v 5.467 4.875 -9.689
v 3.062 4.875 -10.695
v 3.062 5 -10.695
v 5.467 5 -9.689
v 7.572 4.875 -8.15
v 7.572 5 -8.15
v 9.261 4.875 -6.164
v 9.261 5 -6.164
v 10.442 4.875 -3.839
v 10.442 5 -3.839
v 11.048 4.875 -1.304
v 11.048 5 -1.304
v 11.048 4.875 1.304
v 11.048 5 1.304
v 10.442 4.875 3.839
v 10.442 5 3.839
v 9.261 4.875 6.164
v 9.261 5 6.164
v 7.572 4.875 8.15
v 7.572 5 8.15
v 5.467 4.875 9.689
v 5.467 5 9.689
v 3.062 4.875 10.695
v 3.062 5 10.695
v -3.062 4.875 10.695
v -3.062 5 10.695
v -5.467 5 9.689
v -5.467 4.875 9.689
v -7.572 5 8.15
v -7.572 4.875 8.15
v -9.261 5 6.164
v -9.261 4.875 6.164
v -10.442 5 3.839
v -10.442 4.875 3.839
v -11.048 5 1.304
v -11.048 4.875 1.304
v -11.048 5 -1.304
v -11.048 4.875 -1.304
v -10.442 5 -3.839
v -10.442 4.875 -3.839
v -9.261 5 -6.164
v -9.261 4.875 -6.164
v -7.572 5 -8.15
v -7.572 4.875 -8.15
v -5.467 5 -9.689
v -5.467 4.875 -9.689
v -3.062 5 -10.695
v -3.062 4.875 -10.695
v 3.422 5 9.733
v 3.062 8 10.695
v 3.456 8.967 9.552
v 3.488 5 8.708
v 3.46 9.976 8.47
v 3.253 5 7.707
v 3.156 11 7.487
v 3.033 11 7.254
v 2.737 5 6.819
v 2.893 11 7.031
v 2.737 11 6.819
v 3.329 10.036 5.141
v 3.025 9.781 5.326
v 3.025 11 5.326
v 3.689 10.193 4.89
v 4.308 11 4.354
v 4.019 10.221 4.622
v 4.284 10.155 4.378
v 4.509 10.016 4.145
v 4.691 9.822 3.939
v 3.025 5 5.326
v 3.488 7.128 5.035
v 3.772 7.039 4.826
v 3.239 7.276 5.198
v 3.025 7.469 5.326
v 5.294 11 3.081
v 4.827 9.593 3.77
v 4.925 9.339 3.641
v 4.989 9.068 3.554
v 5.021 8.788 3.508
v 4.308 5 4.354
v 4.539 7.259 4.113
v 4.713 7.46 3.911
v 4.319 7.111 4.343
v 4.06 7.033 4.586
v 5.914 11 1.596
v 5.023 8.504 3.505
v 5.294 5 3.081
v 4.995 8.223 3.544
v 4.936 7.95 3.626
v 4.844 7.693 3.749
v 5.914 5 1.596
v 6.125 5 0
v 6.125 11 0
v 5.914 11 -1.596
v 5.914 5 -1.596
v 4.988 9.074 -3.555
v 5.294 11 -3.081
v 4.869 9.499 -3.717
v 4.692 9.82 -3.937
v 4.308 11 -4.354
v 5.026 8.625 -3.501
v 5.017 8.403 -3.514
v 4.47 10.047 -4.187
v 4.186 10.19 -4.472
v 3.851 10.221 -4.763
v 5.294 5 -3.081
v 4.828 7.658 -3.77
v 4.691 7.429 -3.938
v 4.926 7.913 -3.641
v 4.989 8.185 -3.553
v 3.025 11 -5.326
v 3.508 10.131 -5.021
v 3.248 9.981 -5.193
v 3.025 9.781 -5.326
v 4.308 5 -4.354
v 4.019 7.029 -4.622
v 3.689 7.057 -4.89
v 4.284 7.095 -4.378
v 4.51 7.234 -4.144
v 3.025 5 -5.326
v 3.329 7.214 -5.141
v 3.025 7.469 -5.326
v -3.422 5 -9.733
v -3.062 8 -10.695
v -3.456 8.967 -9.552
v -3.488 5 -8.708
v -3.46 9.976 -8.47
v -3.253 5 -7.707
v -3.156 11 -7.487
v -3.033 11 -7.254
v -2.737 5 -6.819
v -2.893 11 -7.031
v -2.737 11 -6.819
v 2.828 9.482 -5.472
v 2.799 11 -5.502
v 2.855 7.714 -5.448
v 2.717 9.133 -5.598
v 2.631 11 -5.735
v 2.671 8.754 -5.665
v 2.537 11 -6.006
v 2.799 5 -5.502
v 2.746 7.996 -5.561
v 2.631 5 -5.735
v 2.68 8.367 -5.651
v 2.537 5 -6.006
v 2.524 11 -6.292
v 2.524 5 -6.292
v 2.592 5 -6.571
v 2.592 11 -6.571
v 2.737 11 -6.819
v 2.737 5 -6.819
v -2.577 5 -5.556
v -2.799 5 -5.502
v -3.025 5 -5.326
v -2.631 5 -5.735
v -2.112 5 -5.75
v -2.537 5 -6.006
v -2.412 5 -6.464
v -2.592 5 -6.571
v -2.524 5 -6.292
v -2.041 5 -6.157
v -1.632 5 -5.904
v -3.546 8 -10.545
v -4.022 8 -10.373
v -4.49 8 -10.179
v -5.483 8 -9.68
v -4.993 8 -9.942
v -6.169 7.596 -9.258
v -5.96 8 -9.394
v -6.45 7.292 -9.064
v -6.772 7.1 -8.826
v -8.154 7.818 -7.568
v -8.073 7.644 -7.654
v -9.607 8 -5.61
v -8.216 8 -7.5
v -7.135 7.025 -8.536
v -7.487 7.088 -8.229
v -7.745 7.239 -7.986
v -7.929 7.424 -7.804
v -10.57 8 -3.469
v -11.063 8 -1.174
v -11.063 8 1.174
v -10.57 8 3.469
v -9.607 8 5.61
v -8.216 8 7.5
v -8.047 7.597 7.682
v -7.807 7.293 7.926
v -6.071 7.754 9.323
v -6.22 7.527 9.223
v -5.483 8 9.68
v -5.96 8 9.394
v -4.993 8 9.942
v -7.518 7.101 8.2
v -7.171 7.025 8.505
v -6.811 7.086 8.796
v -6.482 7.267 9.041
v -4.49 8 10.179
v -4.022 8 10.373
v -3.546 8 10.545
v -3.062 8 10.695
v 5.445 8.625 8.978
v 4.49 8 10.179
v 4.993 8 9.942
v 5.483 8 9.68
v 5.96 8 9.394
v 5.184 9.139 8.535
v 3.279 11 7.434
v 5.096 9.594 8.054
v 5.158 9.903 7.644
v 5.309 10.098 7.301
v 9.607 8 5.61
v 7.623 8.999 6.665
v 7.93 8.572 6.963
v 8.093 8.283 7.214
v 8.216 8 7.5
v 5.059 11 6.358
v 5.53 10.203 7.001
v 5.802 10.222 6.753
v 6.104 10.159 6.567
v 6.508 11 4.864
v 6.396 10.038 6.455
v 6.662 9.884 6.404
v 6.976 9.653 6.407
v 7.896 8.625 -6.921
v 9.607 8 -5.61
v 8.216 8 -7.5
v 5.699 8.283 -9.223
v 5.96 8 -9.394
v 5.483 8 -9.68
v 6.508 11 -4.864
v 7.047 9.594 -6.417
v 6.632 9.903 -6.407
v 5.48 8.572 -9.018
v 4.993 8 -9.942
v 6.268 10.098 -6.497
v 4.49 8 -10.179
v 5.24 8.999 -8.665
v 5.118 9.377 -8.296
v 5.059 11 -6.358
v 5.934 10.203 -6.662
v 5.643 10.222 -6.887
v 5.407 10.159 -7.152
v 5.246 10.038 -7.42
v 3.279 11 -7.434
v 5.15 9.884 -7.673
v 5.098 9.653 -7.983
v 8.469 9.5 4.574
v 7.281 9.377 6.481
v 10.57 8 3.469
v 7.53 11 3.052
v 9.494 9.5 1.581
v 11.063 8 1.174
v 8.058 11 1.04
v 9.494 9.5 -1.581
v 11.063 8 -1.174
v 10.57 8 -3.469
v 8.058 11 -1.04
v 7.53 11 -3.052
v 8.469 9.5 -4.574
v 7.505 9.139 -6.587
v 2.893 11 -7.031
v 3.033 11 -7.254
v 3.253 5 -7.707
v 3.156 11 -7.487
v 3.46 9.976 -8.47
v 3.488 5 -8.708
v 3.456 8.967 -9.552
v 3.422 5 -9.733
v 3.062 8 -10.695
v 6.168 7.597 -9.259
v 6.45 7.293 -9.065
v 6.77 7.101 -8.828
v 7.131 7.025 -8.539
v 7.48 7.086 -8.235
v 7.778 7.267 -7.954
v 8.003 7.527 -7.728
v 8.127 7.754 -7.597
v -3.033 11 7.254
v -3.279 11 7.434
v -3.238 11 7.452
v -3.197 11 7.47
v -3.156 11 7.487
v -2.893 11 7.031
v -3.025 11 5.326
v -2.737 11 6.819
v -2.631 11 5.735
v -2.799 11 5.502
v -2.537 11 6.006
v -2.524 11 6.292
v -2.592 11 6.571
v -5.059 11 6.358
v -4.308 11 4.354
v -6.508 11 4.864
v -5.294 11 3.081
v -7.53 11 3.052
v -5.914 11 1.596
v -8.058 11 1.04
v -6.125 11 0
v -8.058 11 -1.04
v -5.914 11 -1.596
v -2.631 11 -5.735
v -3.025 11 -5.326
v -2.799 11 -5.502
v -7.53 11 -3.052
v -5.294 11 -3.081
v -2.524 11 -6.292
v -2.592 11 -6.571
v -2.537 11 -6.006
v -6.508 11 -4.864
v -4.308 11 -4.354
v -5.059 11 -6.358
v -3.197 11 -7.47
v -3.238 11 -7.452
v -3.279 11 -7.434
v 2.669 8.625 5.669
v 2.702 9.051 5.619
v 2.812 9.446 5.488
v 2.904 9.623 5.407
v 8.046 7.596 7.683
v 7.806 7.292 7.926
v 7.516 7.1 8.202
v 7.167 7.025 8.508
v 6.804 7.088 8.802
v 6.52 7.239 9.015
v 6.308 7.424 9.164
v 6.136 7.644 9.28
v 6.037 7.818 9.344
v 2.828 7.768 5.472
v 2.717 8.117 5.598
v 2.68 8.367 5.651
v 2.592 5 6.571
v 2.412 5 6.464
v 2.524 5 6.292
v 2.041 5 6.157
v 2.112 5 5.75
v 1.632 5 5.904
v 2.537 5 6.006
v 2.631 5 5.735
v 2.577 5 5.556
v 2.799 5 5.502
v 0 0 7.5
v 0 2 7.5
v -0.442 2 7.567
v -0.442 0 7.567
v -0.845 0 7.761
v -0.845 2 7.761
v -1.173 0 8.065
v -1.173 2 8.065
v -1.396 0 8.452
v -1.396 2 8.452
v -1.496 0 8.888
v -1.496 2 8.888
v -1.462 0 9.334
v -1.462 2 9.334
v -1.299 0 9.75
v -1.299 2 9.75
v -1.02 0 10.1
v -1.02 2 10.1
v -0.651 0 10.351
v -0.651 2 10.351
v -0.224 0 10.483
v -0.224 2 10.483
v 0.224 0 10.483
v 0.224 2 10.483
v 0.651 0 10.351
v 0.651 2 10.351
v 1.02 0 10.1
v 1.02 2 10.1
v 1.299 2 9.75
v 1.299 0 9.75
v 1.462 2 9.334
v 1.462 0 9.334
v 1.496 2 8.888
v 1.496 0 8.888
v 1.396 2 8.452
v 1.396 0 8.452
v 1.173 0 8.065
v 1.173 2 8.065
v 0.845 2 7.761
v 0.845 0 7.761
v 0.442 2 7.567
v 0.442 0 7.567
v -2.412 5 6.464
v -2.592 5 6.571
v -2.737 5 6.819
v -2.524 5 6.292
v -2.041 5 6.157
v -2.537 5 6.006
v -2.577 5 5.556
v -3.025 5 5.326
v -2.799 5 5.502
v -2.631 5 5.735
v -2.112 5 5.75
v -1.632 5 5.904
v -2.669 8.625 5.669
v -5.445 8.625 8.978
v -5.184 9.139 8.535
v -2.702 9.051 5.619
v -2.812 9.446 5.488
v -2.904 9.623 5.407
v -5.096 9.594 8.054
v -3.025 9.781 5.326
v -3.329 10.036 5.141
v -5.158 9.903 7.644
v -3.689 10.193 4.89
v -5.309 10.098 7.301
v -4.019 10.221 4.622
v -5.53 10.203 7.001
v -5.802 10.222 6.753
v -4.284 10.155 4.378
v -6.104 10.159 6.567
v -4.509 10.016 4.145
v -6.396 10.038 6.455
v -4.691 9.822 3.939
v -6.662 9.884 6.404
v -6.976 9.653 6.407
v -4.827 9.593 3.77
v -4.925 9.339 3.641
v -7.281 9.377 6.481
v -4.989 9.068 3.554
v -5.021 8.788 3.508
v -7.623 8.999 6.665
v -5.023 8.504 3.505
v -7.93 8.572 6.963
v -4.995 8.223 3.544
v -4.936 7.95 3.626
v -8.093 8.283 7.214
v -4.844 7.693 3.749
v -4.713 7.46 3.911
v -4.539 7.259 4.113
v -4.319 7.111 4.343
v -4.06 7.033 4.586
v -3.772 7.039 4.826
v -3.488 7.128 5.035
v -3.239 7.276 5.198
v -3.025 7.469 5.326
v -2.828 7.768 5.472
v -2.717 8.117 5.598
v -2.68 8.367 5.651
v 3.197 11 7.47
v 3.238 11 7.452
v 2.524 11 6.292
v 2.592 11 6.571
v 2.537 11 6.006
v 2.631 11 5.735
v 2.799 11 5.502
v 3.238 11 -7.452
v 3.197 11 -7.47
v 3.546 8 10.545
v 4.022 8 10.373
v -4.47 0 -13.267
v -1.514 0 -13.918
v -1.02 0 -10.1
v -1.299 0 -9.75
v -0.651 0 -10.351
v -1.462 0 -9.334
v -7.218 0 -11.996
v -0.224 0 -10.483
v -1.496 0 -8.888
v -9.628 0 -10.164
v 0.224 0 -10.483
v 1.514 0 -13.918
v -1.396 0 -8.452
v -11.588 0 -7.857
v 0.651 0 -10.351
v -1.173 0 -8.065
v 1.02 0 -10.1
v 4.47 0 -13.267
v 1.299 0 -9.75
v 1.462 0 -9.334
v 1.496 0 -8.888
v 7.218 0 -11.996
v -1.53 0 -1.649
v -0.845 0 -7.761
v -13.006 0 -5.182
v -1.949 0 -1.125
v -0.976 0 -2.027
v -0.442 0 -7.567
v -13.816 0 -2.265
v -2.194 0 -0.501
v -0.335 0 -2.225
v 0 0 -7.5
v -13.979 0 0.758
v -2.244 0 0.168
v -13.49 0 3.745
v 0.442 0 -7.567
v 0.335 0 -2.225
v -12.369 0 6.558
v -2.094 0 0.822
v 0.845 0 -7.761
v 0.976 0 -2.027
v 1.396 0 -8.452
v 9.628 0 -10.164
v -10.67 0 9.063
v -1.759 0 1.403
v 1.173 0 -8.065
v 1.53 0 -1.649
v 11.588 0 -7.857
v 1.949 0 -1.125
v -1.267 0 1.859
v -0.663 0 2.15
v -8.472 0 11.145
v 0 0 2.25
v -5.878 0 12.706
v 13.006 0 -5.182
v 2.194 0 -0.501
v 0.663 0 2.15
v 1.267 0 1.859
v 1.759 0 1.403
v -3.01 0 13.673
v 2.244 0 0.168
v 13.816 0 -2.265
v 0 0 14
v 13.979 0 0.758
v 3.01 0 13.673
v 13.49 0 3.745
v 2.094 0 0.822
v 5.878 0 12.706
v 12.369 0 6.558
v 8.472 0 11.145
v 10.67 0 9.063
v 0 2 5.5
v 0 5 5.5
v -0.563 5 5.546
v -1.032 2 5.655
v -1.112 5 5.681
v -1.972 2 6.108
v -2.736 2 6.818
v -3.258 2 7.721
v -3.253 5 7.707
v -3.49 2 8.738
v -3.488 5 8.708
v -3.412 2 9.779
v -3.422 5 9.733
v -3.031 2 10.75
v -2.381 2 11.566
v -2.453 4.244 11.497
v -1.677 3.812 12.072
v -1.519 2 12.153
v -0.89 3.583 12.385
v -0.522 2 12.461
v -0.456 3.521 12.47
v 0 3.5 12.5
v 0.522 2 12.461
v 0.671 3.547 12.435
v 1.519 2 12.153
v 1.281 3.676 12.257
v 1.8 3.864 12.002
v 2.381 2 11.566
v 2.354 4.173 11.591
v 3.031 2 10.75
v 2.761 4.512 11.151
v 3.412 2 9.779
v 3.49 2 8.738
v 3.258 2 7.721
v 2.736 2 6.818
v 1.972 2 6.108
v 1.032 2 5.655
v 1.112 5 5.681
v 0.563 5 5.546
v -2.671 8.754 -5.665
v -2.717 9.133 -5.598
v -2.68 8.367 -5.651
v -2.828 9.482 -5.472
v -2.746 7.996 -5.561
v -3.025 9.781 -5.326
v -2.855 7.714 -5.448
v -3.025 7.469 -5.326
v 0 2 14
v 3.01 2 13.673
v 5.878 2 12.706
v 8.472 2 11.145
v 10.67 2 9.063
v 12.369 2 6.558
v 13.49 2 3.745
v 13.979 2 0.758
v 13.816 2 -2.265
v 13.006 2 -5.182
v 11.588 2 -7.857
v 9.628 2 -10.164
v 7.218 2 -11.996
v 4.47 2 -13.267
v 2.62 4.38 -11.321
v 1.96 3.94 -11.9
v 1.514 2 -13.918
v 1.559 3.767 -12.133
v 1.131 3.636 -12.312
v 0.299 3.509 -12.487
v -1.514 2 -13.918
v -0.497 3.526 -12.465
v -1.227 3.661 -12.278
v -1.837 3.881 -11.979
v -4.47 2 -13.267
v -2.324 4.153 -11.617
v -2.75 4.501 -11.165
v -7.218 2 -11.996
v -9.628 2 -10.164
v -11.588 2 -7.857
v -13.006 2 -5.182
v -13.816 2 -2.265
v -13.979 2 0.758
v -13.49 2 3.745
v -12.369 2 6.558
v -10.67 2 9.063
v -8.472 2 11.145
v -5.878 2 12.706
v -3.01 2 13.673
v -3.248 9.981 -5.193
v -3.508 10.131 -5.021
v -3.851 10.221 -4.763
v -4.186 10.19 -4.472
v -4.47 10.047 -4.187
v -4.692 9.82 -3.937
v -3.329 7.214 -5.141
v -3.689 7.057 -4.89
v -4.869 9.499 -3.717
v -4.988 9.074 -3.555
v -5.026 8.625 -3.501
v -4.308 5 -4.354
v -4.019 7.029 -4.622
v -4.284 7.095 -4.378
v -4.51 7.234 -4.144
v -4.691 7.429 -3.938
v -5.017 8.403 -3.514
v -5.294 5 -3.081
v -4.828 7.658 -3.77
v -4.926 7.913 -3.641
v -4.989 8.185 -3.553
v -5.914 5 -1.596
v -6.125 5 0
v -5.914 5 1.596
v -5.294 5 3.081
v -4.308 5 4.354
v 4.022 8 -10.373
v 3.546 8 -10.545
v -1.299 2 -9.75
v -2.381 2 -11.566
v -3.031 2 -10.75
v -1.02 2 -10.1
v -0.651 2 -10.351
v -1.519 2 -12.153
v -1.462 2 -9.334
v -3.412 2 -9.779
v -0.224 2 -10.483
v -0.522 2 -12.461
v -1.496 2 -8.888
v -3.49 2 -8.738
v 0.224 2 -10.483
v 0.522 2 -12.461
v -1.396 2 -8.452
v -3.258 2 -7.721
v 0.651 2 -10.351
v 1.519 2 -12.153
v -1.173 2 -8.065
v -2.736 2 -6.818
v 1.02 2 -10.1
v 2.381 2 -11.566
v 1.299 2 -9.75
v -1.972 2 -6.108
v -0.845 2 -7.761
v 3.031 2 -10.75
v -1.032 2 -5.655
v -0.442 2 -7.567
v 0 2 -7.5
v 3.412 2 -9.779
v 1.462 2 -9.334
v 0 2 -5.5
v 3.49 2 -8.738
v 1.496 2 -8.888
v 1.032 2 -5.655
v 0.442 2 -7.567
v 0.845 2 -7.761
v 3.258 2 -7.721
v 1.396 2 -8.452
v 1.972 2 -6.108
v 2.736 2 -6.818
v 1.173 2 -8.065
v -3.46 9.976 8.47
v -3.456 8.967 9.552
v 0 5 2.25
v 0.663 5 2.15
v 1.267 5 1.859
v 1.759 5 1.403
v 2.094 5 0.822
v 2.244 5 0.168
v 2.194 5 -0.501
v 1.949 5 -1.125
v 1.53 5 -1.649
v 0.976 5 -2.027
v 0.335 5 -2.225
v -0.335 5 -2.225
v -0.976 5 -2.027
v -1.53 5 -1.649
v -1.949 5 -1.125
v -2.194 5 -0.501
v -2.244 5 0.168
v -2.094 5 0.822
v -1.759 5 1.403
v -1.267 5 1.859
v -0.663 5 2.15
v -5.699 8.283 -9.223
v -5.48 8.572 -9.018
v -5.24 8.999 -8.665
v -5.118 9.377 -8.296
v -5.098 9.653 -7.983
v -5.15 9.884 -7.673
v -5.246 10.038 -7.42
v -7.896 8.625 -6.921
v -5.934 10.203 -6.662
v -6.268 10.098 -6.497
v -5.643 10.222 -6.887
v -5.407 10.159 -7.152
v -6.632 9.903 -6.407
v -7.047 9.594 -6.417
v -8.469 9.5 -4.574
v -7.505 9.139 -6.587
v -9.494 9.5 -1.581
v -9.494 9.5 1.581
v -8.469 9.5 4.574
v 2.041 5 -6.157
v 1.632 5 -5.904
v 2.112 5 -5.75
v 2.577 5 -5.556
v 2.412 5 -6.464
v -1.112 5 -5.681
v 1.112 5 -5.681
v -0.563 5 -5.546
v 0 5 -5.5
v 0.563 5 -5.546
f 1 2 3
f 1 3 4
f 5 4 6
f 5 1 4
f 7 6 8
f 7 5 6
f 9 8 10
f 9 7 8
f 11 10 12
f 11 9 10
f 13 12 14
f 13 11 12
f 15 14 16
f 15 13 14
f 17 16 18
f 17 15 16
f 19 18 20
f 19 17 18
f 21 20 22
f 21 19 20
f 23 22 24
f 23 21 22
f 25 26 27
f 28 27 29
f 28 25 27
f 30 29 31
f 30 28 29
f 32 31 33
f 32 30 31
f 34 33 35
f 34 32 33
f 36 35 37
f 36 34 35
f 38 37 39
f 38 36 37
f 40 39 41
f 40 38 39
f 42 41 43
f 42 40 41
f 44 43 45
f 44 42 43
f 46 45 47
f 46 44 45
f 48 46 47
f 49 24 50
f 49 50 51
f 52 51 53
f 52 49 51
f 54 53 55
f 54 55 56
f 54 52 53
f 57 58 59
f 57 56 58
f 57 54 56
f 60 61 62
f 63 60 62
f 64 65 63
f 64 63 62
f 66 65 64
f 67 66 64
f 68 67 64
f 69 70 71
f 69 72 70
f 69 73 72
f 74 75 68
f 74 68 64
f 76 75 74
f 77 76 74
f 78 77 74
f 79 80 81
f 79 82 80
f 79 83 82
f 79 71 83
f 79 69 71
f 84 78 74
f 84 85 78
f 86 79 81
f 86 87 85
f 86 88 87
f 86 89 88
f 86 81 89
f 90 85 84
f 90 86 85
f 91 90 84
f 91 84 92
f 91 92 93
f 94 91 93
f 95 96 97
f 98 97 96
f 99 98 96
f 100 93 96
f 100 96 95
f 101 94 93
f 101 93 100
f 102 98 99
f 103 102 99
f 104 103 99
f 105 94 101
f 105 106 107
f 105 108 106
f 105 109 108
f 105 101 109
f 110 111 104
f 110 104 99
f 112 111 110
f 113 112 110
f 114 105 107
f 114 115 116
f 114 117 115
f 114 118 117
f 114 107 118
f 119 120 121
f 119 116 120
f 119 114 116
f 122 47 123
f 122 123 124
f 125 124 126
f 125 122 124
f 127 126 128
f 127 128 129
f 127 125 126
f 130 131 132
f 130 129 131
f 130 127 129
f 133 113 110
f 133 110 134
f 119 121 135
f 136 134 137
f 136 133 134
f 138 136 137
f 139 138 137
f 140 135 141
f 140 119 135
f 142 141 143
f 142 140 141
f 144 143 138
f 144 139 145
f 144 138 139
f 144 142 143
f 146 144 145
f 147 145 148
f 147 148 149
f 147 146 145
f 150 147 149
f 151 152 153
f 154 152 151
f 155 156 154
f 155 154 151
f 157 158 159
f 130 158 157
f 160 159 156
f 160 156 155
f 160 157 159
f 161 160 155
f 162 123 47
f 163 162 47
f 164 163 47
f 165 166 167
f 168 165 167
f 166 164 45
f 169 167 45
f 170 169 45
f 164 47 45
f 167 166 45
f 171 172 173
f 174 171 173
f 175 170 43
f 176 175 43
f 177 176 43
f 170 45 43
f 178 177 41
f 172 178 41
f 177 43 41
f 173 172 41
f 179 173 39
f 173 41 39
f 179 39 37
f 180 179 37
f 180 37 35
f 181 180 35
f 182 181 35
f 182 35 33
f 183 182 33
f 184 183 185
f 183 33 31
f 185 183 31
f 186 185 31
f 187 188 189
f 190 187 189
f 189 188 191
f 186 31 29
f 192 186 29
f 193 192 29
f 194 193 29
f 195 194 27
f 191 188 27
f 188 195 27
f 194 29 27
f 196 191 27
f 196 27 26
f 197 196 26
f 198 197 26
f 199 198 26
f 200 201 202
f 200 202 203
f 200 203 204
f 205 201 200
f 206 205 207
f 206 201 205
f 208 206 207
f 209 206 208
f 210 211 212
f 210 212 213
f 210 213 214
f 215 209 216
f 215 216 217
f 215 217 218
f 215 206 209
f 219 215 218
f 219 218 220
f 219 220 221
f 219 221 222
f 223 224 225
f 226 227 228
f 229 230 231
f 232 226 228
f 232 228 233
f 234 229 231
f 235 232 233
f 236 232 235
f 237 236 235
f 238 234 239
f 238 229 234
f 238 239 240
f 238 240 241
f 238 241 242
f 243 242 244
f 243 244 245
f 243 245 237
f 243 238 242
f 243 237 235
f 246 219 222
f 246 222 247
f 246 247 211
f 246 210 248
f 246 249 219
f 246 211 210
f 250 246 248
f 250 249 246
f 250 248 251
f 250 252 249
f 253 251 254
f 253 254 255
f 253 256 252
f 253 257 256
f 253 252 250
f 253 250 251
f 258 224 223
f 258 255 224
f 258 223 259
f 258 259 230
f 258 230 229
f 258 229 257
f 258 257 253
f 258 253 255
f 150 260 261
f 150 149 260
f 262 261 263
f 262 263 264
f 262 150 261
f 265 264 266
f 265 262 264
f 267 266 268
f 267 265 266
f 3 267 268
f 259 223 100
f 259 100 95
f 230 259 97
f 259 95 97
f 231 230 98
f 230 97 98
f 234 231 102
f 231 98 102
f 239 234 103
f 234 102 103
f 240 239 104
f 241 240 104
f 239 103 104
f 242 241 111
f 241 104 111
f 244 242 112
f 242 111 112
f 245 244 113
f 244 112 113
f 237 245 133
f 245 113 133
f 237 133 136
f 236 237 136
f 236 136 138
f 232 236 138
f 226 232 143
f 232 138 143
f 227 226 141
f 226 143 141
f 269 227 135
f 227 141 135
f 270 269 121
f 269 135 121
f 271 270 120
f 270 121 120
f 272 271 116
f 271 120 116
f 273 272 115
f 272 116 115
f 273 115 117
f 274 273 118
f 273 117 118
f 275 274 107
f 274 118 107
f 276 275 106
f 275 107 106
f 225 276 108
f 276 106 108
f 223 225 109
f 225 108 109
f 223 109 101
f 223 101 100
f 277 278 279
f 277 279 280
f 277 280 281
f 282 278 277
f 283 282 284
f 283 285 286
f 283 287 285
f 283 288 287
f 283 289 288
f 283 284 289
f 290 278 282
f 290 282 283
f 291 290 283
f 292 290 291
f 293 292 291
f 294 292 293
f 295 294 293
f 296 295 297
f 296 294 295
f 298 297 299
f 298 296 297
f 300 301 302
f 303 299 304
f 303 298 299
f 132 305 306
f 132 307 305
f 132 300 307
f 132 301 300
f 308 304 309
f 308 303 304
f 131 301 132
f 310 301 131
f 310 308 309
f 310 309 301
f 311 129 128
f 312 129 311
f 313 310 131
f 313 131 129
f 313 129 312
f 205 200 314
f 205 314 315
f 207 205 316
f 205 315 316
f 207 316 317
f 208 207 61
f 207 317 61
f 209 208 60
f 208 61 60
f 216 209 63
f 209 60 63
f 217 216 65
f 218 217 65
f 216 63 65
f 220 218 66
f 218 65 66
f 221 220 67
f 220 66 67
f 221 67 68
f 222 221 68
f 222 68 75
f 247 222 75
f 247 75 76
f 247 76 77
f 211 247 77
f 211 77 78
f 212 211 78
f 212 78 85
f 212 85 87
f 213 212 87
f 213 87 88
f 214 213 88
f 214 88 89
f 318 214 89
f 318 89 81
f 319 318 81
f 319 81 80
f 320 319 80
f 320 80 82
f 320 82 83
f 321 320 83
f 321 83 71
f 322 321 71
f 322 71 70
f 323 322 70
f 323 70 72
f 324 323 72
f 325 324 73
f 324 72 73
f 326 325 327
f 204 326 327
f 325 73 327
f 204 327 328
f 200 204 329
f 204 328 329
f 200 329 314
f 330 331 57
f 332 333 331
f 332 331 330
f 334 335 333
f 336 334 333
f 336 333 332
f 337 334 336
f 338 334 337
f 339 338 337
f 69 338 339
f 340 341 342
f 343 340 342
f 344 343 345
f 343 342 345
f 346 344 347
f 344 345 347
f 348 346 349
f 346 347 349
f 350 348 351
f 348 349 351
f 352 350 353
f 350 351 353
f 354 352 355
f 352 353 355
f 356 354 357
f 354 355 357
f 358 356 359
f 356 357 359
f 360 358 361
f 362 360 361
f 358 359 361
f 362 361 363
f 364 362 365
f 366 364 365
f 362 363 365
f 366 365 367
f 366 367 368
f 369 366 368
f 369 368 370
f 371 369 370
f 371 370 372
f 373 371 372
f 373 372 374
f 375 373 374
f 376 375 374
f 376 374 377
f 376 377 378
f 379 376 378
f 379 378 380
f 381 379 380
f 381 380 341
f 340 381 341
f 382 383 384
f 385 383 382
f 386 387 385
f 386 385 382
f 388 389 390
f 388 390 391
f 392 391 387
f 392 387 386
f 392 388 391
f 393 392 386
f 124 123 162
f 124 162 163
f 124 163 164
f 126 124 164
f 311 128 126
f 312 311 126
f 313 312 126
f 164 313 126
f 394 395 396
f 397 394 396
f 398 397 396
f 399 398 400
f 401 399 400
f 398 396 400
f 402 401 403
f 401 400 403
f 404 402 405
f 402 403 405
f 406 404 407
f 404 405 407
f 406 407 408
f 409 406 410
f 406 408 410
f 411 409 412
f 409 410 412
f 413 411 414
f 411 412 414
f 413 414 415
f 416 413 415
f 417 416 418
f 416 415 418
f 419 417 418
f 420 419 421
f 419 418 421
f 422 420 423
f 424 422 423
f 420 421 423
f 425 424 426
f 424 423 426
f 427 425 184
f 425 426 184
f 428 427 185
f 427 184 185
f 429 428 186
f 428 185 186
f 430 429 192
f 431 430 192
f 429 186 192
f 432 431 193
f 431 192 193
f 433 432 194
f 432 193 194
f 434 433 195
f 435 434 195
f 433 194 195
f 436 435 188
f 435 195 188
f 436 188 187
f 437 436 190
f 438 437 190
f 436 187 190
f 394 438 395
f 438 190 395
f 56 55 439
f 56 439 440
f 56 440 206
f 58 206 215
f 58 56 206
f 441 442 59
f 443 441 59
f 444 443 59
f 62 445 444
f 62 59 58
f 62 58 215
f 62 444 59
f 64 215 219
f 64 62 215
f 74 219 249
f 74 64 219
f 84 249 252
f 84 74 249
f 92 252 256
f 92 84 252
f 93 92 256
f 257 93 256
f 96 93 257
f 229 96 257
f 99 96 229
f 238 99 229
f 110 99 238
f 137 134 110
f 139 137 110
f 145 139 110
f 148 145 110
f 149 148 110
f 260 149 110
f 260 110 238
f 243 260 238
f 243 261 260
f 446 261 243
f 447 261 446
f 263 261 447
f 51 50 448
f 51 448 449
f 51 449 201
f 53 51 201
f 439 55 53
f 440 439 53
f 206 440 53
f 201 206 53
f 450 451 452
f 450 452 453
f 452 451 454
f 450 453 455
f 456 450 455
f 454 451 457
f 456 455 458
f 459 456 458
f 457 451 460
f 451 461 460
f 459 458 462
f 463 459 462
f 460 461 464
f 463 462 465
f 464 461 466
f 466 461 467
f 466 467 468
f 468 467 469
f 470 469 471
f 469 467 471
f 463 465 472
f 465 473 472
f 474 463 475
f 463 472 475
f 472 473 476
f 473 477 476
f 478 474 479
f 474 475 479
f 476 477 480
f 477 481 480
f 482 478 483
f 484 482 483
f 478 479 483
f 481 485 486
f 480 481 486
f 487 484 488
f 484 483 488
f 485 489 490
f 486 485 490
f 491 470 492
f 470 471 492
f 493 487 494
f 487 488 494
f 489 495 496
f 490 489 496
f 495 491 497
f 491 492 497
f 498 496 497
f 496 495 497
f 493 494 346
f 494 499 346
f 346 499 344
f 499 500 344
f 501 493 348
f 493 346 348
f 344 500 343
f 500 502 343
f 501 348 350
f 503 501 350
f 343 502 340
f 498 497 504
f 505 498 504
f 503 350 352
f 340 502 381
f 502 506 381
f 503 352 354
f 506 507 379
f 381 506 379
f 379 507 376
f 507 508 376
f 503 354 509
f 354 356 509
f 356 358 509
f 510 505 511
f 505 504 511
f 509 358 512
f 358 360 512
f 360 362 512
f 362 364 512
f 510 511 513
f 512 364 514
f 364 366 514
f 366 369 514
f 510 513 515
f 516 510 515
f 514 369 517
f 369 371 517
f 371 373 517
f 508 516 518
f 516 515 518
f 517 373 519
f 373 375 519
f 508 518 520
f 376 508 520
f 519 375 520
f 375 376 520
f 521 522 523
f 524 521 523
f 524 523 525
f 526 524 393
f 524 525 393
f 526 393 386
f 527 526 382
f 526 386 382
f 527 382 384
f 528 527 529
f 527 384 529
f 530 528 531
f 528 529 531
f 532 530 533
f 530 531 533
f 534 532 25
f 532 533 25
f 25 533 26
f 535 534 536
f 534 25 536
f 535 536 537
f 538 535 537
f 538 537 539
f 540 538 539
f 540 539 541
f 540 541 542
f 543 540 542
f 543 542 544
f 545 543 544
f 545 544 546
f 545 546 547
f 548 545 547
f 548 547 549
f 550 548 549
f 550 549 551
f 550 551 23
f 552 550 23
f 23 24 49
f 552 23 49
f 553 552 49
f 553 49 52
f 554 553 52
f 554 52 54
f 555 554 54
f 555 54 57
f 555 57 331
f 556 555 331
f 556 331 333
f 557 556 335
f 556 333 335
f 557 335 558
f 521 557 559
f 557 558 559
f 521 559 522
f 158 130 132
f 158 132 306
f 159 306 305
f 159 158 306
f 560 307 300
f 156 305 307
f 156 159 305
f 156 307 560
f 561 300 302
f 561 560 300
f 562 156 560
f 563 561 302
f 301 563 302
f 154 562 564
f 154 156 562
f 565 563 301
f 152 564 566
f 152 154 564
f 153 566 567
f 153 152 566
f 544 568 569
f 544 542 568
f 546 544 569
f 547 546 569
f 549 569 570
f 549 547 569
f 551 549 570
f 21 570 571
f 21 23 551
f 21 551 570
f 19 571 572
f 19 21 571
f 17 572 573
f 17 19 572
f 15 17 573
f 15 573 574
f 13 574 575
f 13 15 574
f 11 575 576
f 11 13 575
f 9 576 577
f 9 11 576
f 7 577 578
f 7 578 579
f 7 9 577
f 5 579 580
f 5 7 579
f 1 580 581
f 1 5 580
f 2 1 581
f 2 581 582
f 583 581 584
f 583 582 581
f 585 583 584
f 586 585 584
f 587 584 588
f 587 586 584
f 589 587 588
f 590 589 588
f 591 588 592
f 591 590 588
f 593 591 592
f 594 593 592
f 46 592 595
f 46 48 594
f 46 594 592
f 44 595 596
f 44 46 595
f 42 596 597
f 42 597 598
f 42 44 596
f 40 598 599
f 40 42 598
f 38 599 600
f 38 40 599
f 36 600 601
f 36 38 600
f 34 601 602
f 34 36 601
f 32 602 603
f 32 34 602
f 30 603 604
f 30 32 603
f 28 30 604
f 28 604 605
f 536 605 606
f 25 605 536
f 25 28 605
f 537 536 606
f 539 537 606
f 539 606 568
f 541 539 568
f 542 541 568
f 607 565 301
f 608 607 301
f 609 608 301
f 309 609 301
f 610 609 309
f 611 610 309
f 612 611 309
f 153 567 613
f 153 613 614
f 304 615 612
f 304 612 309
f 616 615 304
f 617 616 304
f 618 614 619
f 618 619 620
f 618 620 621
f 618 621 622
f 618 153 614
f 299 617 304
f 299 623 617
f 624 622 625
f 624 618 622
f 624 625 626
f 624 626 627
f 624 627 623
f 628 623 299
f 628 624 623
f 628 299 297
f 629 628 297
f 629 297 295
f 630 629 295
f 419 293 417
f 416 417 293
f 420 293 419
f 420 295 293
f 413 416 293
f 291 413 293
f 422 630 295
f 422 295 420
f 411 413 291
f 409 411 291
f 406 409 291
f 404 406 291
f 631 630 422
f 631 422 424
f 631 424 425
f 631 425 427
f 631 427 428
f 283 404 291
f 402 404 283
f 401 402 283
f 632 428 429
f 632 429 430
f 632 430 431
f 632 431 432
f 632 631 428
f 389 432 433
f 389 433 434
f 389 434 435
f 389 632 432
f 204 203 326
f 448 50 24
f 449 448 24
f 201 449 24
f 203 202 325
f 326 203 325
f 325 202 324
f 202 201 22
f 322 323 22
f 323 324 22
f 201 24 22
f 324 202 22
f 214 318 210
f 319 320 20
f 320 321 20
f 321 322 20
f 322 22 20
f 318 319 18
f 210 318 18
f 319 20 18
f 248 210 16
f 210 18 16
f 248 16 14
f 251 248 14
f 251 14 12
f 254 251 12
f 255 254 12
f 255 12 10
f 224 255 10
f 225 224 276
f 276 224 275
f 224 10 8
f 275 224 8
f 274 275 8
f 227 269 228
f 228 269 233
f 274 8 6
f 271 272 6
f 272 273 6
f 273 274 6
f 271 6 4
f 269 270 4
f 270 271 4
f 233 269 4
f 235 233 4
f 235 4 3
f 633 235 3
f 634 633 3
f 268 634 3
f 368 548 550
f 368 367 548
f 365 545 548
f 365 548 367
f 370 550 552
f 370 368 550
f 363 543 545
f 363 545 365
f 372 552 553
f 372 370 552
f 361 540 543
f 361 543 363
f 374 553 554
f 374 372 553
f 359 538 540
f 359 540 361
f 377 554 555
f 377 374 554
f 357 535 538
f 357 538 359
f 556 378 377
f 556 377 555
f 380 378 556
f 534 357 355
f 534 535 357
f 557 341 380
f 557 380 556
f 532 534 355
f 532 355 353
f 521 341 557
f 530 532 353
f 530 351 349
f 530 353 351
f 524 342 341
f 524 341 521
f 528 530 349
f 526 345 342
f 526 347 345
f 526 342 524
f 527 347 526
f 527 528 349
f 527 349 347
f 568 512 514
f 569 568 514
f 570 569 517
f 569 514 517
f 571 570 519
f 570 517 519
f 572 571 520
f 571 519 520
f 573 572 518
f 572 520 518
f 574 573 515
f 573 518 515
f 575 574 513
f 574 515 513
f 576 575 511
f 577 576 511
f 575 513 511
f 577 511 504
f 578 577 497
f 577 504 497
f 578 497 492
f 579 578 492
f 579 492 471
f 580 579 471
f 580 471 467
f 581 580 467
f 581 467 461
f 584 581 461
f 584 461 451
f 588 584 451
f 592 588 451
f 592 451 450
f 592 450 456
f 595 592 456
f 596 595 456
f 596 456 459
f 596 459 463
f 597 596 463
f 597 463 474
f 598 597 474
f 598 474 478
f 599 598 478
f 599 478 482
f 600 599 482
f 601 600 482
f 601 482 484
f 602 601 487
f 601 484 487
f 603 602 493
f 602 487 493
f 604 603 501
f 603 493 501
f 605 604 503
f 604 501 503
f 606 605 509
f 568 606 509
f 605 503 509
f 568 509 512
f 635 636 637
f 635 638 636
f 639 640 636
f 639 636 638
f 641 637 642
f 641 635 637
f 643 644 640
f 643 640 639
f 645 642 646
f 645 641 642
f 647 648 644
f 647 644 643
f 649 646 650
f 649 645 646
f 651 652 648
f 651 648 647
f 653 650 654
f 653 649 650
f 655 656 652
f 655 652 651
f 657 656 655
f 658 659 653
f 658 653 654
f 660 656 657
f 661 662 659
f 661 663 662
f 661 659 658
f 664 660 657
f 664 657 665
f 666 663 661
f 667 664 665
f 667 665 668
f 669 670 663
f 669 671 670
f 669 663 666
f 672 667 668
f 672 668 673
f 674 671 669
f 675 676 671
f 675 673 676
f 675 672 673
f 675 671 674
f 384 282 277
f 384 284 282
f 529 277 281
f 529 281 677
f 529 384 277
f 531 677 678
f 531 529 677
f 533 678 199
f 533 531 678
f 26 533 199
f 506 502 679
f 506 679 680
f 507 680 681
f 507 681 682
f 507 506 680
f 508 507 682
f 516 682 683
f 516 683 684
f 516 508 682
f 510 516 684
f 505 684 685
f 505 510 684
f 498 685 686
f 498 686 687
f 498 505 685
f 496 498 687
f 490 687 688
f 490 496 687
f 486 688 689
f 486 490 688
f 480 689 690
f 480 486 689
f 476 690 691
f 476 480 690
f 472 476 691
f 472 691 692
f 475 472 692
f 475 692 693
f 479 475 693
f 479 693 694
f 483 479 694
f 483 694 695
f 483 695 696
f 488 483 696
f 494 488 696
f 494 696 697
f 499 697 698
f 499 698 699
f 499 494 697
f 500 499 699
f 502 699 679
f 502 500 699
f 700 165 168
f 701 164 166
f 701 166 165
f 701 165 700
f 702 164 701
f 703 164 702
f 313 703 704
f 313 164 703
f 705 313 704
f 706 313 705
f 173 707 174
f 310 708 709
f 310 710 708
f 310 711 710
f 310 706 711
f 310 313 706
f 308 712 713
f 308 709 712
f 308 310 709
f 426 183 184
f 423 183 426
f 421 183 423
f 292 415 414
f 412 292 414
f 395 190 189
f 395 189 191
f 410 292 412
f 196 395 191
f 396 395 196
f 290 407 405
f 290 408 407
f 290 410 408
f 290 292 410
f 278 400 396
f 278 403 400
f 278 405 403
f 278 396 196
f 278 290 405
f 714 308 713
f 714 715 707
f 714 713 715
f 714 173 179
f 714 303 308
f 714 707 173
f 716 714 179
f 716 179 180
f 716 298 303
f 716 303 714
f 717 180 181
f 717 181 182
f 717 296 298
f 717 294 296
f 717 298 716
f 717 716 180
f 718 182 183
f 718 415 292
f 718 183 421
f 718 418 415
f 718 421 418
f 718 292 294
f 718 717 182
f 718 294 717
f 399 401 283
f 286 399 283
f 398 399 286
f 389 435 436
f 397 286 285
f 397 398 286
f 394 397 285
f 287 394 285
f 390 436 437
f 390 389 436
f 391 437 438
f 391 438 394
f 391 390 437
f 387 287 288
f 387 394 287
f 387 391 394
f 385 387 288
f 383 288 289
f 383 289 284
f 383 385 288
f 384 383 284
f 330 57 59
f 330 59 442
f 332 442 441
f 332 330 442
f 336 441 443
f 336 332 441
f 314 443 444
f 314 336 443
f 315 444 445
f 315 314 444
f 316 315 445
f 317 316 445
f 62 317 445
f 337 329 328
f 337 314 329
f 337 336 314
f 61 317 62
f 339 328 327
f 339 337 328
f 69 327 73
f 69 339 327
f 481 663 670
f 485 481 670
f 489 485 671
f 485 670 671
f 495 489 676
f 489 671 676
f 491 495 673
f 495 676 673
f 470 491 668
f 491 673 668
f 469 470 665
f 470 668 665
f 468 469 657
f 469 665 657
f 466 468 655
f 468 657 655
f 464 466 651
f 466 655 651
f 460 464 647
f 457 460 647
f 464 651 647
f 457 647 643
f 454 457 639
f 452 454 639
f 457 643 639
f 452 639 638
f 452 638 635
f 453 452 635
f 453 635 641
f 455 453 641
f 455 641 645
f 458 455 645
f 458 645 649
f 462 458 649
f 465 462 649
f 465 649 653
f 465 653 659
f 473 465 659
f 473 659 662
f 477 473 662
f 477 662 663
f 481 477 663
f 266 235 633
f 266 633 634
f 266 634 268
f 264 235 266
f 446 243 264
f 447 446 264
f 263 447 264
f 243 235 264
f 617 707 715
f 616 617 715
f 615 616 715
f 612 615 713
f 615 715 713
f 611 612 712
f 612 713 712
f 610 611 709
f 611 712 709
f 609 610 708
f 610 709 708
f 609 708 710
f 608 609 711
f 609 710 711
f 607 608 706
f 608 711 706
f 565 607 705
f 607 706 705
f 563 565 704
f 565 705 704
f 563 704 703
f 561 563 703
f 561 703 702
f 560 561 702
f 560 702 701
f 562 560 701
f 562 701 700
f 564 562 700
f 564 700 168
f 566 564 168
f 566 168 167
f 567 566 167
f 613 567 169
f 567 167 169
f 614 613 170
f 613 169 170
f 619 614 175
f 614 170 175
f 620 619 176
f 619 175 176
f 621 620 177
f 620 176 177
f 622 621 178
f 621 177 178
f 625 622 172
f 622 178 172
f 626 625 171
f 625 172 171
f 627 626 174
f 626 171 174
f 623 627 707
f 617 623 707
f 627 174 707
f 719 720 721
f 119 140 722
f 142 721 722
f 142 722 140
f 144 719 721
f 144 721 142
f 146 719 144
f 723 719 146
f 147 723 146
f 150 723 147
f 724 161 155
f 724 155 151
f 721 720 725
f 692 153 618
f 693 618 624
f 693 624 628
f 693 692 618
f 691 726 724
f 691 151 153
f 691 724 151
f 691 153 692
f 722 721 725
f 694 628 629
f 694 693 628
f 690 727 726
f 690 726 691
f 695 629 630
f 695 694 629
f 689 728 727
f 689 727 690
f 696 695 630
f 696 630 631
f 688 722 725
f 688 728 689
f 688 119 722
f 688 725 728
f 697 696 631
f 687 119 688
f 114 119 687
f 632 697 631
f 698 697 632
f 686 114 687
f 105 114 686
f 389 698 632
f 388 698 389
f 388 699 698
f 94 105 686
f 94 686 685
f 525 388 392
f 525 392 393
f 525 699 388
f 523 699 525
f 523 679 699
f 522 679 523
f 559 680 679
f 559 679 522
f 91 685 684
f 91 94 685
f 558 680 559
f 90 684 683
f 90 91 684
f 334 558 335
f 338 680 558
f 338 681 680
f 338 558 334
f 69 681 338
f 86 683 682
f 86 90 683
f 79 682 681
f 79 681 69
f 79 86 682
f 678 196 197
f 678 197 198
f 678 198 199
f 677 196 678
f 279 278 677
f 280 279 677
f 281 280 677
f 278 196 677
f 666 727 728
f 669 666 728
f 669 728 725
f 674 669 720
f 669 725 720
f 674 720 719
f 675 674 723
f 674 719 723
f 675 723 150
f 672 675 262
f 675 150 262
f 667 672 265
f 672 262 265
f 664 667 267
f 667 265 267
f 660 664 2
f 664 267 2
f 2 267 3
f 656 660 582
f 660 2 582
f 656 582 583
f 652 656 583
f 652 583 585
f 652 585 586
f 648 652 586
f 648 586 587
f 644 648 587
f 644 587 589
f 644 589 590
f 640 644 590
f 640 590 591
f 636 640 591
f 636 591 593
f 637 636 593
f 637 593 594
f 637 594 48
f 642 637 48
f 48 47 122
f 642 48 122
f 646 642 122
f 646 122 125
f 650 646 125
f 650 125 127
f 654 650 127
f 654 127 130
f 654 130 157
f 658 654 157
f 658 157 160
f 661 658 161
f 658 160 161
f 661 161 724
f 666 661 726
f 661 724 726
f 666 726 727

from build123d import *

# Parameters (mm, degrees)
SKETCH1_R           = 14
SKETCH1_R_2         = 2.25
BOSS_EXTRUDE1_DEPTH = 5
SKETCH2_R           = 1.5
CUT_EXTRUDE1_DEPTH  = 21.420577857
SKETCH4_R           = 3.5
CUT_EXTRUDE2_DEPTH  = 3
CIRPATTERN1_COUNT   = 2
SKETCH5_R           = 11.125
SKETCH5_R_2         = 6.125
BOSS_EXTRUDE2_DEPTH = 6
SKETCH6_R           = 3.5
CUT_EXTRUDE3_DEPTH  = 21.688160866
CHAMFER1_SIZE       = 3
FILLET1_START       = 5
FILLET1_DEPTH       = 7
SKETCH8_R           = 1.6
CUT_EXTRUDE4_DEPTH  = 23.649503429
CHAMFER2_SIZE       = 3
CIRPATTERN2_COUNT   = 2
CIRPATTERN2_ANGLE   = 100


with BuildPart() as part:
    # Sketch1 → Boss-Extrude1 (new body)
    with BuildSketch(Plane(origin=(0, 0, 0), x_dir=(1, 0, 0), z_dir=(0, 1, 0))):
        with Locations(Location((0, 0, 0), (0, 0, 270))):
            Circle(SKETCH1_R)
        with Locations(Location((0, 0, 0), (0, 0, 270))):
            Circle(SKETCH1_R_2, mode=Mode.SUBTRACT)
    extrude(amount=BOSS_EXTRUDE1_DEPTH)

    # Sketch2 → Cut-Extrude1 (cut, through all)
    with BuildSketch(Plane(origin=(0, 5, 0), x_dir=(1, 0, 0), z_dir=(0, 1, 0))):
        with Locations(Location((0, 9, 0), (0, 0, 270))):
            Circle(SKETCH2_R)
    cut_extrude1 = extrude(amount=-CUT_EXTRUDE1_DEPTH, mode=Mode.SUBTRACT)

    # Sketch4 → Cut-Extrude2 (cut)
    with BuildSketch(Plane(origin=(0, 5, 0), x_dir=(1, 0, 0), z_dir=(0, 1, 0))):
        with Locations(Location((0, 9, 0), (0, 0, 270))):
            Circle(SKETCH4_R)
    cut_extrude2 = extrude(amount=-CUT_EXTRUDE2_DEPTH, mode=Mode.SUBTRACT)

    # CirPattern1: Cut-Extrude1, Cut-Extrude2 ×2 about axis
    cirpattern1_axis = Axis((0, 0, 0), (0, 1, 0))
    add([cut_extrude1.rotate(cirpattern1_axis, i * 360 / CIRPATTERN1_COUNT) for i in range(1, CIRPATTERN1_COUNT)], mode=Mode.SUBTRACT)
    add([cut_extrude2.rotate(cirpattern1_axis, i * 360 / CIRPATTERN1_COUNT) for i in range(1, CIRPATTERN1_COUNT)], mode=Mode.SUBTRACT)

    # Sketch5 → Boss-Extrude2 (add)
    with BuildSketch(Plane(origin=(0, 5, 0), x_dir=(1, 0, 0), z_dir=(0, 1, 0))):
        with Locations(Location((0, 0, 0), (0, 0, 74.023861397))):
            Circle(SKETCH5_R)
        with Locations(Location((0, 0, 0), (0, 0, 105.450591775))):
            Circle(SKETCH5_R_2, mode=Mode.SUBTRACT)
    extrude(amount=BOSS_EXTRUDE2_DEPTH)

    # Sketch6 → Cut-Extrude3 (cut, through all)
    with BuildSketch(Plane(origin=(0, 5, 0), x_dir=(1, 0, 0), z_dir=(0, 1, 0))):
        with Locations(Location((0, 9, 0), (0, 0, 270))):
            Circle(SKETCH6_R)
        with Locations(Location((0, -9, 0), (0, 0, 331.028467776))):
            Circle(SKETCH6_R)
    extrude(amount=CUT_EXTRUDE3_DEPTH, mode=Mode.SUBTRACT)

    # Chamfer1
    # the kernel refuses this chamfer: 3 mm, written as the material it takes off along each edge
    with BuildSketch(Plane(origin=(0, 5, 0), x_dir=(0, 0, 1), z_dir=(-1, 0, 0))) as chamfer1_piece_1_section:
        Polygon((14, -CHAMFER1_SIZE), (14 - CHAMFER1_SIZE, 0), (14, 0), align=None)
    chamfer1_piece_1 = revolve(axis=Axis((0, 5, 0), (0, 1, 0)), mode=Mode.PRIVATE)
    chamfer1_piece_1 = chamfer1_piece_1 - Plane(origin=(0, 5, 0), x_dir=(0.2752370049355325, 0, -0.9613764044920791), z_dir=(0, -1, 0)) * Cylinder(11.125, 56, mode=Mode.PRIVATE)
    add(chamfer1_piece_1, mode=Mode.SUBTRACT)

    # Fillet1: read off the stored shape, not the designer's step
    # Fillet1 outline → Fillet1 (cut)
    with BuildSketch(Plane(origin=(0, 0, 0), x_dir=(1, 0, 0), z_dir=(0, 1, 0)).offset(FILLET1_START)):
        with BuildLine():
            ThreePointArc((2.73704056, -6.818576389), (2.537172315, -6.005807905), (3.025150093, -5.325794956))
            ThreePointArc((3.025150093, -5.325794956), (2.346304597, -5.65778046), (1.631744733, -5.903645833))
            ThreePointArc((1.631744733, -5.903645833), (2.231780839, -6.303863081), (2.73704056, -6.818576389))
        make_face()
        with BuildLine():
            ThreePointArc((1.631744733, 5.903645833), (2.346304597, 5.65778046), (3.025150093, 5.325794956))
            ThreePointArc((3.025150093, 5.325794956), (2.537172315, 6.005807905), (2.73704056, 6.818576389))
            ThreePointArc((2.73704056, 6.818576389), (2.231780839, 6.303863081), (1.631744733, 5.903645833))
        make_face()
        with BuildLine():
            ThreePointArc((-2.73704056, -6.818576389), (-2.231780839, -6.303863081), (-1.631744733, -5.903645833))
            ThreePointArc((-1.631744733, -5.903645833), (-2.346304597, -5.65778046), (-3.025150093, -5.325794956))
            ThreePointArc((-3.025150093, -5.325794956), (-2.537172315, -6.005807905), (-2.73704056, -6.818576389))
        make_face()
        with BuildLine():
            ThreePointArc((-3.025150093, 5.325794956), (-2.346304597, 5.65778046), (-1.631744733, 5.903645833))
            ThreePointArc((-1.631744733, 5.903645833), (-2.231780839, 6.303863081), (-2.73704056, 6.818576389))
            ThreePointArc((-2.73704056, 6.818576389), (-2.537172315, 6.005807905), (-3.025150093, 5.325794956))
        make_face()
    extrude(amount=FILLET1_DEPTH, mode=Mode.SUBTRACT)

    # Sketch8 → Cut-Extrude4 (cut, symmetric)
    with BuildSketch(Plane(origin=(0, 0, 0), x_dir=(0, -1, 0), z_dir=(-0.6427876096865406, 0, 0.7660444431189771))):
        with Locations(Location((-8.625, 0, 0), (0, 0, 90))):
            Circle(SKETCH8_R)
    cut_extrude4 = extrude(amount=CUT_EXTRUDE4_DEPTH, both=True, mode=Mode.SUBTRACT)

    # Chamfer2
    # the kernel refuses this chamfer: 3 mm, written as the material it takes off along each edge
    with BuildSketch(Plane(origin=(0, 11, 0), x_dir=(-0.4035609850169031, 0, 0.9149527481636345), z_dir=(-0.9149527481636345, 0, -0.4035609850169031))) as chamfer2_piece_1:
        Polygon((11.125, -CHAMFER2_SIZE), (11.125 - CHAMFER2_SIZE, 0), (11.125, 0), align=None)
    revolve(axis=Axis((0, 11, 0), (0, 1, 0)), revolution_arc=227.60196489, mode=Mode.SUBTRACT)
    with BuildSketch(Plane(origin=(0, 11, 0), x_dir=(0.40356098501590637, 0, -0.914952748164074), z_dir=(0.914952748164074, 0, 0.40356098501590637))) as chamfer2_piece_2:
        Polygon((11.125, -CHAMFER2_SIZE), (11.125 - CHAMFER2_SIZE, 0), (11.125, 0), align=None)
    revolve(axis=Axis((0, 11, 0), (0, 1, 0)), revolution_arc=227.60196489, mode=Mode.SUBTRACT)

    # CirPattern2: Cut-Extrude4 ×2 about axis
    cirpattern2_axis = Axis((0, 5, 0), (0, -1, 0))
    for i in range(1, CIRPATTERN2_COUNT):
        add(cut_extrude4.rotate(cirpattern2_axis, i * CIRPATTERN2_ANGLE / (CIRPATTERN2_COUNT - 1)), mode=Mode.SUBTRACT)


solid = part.part
